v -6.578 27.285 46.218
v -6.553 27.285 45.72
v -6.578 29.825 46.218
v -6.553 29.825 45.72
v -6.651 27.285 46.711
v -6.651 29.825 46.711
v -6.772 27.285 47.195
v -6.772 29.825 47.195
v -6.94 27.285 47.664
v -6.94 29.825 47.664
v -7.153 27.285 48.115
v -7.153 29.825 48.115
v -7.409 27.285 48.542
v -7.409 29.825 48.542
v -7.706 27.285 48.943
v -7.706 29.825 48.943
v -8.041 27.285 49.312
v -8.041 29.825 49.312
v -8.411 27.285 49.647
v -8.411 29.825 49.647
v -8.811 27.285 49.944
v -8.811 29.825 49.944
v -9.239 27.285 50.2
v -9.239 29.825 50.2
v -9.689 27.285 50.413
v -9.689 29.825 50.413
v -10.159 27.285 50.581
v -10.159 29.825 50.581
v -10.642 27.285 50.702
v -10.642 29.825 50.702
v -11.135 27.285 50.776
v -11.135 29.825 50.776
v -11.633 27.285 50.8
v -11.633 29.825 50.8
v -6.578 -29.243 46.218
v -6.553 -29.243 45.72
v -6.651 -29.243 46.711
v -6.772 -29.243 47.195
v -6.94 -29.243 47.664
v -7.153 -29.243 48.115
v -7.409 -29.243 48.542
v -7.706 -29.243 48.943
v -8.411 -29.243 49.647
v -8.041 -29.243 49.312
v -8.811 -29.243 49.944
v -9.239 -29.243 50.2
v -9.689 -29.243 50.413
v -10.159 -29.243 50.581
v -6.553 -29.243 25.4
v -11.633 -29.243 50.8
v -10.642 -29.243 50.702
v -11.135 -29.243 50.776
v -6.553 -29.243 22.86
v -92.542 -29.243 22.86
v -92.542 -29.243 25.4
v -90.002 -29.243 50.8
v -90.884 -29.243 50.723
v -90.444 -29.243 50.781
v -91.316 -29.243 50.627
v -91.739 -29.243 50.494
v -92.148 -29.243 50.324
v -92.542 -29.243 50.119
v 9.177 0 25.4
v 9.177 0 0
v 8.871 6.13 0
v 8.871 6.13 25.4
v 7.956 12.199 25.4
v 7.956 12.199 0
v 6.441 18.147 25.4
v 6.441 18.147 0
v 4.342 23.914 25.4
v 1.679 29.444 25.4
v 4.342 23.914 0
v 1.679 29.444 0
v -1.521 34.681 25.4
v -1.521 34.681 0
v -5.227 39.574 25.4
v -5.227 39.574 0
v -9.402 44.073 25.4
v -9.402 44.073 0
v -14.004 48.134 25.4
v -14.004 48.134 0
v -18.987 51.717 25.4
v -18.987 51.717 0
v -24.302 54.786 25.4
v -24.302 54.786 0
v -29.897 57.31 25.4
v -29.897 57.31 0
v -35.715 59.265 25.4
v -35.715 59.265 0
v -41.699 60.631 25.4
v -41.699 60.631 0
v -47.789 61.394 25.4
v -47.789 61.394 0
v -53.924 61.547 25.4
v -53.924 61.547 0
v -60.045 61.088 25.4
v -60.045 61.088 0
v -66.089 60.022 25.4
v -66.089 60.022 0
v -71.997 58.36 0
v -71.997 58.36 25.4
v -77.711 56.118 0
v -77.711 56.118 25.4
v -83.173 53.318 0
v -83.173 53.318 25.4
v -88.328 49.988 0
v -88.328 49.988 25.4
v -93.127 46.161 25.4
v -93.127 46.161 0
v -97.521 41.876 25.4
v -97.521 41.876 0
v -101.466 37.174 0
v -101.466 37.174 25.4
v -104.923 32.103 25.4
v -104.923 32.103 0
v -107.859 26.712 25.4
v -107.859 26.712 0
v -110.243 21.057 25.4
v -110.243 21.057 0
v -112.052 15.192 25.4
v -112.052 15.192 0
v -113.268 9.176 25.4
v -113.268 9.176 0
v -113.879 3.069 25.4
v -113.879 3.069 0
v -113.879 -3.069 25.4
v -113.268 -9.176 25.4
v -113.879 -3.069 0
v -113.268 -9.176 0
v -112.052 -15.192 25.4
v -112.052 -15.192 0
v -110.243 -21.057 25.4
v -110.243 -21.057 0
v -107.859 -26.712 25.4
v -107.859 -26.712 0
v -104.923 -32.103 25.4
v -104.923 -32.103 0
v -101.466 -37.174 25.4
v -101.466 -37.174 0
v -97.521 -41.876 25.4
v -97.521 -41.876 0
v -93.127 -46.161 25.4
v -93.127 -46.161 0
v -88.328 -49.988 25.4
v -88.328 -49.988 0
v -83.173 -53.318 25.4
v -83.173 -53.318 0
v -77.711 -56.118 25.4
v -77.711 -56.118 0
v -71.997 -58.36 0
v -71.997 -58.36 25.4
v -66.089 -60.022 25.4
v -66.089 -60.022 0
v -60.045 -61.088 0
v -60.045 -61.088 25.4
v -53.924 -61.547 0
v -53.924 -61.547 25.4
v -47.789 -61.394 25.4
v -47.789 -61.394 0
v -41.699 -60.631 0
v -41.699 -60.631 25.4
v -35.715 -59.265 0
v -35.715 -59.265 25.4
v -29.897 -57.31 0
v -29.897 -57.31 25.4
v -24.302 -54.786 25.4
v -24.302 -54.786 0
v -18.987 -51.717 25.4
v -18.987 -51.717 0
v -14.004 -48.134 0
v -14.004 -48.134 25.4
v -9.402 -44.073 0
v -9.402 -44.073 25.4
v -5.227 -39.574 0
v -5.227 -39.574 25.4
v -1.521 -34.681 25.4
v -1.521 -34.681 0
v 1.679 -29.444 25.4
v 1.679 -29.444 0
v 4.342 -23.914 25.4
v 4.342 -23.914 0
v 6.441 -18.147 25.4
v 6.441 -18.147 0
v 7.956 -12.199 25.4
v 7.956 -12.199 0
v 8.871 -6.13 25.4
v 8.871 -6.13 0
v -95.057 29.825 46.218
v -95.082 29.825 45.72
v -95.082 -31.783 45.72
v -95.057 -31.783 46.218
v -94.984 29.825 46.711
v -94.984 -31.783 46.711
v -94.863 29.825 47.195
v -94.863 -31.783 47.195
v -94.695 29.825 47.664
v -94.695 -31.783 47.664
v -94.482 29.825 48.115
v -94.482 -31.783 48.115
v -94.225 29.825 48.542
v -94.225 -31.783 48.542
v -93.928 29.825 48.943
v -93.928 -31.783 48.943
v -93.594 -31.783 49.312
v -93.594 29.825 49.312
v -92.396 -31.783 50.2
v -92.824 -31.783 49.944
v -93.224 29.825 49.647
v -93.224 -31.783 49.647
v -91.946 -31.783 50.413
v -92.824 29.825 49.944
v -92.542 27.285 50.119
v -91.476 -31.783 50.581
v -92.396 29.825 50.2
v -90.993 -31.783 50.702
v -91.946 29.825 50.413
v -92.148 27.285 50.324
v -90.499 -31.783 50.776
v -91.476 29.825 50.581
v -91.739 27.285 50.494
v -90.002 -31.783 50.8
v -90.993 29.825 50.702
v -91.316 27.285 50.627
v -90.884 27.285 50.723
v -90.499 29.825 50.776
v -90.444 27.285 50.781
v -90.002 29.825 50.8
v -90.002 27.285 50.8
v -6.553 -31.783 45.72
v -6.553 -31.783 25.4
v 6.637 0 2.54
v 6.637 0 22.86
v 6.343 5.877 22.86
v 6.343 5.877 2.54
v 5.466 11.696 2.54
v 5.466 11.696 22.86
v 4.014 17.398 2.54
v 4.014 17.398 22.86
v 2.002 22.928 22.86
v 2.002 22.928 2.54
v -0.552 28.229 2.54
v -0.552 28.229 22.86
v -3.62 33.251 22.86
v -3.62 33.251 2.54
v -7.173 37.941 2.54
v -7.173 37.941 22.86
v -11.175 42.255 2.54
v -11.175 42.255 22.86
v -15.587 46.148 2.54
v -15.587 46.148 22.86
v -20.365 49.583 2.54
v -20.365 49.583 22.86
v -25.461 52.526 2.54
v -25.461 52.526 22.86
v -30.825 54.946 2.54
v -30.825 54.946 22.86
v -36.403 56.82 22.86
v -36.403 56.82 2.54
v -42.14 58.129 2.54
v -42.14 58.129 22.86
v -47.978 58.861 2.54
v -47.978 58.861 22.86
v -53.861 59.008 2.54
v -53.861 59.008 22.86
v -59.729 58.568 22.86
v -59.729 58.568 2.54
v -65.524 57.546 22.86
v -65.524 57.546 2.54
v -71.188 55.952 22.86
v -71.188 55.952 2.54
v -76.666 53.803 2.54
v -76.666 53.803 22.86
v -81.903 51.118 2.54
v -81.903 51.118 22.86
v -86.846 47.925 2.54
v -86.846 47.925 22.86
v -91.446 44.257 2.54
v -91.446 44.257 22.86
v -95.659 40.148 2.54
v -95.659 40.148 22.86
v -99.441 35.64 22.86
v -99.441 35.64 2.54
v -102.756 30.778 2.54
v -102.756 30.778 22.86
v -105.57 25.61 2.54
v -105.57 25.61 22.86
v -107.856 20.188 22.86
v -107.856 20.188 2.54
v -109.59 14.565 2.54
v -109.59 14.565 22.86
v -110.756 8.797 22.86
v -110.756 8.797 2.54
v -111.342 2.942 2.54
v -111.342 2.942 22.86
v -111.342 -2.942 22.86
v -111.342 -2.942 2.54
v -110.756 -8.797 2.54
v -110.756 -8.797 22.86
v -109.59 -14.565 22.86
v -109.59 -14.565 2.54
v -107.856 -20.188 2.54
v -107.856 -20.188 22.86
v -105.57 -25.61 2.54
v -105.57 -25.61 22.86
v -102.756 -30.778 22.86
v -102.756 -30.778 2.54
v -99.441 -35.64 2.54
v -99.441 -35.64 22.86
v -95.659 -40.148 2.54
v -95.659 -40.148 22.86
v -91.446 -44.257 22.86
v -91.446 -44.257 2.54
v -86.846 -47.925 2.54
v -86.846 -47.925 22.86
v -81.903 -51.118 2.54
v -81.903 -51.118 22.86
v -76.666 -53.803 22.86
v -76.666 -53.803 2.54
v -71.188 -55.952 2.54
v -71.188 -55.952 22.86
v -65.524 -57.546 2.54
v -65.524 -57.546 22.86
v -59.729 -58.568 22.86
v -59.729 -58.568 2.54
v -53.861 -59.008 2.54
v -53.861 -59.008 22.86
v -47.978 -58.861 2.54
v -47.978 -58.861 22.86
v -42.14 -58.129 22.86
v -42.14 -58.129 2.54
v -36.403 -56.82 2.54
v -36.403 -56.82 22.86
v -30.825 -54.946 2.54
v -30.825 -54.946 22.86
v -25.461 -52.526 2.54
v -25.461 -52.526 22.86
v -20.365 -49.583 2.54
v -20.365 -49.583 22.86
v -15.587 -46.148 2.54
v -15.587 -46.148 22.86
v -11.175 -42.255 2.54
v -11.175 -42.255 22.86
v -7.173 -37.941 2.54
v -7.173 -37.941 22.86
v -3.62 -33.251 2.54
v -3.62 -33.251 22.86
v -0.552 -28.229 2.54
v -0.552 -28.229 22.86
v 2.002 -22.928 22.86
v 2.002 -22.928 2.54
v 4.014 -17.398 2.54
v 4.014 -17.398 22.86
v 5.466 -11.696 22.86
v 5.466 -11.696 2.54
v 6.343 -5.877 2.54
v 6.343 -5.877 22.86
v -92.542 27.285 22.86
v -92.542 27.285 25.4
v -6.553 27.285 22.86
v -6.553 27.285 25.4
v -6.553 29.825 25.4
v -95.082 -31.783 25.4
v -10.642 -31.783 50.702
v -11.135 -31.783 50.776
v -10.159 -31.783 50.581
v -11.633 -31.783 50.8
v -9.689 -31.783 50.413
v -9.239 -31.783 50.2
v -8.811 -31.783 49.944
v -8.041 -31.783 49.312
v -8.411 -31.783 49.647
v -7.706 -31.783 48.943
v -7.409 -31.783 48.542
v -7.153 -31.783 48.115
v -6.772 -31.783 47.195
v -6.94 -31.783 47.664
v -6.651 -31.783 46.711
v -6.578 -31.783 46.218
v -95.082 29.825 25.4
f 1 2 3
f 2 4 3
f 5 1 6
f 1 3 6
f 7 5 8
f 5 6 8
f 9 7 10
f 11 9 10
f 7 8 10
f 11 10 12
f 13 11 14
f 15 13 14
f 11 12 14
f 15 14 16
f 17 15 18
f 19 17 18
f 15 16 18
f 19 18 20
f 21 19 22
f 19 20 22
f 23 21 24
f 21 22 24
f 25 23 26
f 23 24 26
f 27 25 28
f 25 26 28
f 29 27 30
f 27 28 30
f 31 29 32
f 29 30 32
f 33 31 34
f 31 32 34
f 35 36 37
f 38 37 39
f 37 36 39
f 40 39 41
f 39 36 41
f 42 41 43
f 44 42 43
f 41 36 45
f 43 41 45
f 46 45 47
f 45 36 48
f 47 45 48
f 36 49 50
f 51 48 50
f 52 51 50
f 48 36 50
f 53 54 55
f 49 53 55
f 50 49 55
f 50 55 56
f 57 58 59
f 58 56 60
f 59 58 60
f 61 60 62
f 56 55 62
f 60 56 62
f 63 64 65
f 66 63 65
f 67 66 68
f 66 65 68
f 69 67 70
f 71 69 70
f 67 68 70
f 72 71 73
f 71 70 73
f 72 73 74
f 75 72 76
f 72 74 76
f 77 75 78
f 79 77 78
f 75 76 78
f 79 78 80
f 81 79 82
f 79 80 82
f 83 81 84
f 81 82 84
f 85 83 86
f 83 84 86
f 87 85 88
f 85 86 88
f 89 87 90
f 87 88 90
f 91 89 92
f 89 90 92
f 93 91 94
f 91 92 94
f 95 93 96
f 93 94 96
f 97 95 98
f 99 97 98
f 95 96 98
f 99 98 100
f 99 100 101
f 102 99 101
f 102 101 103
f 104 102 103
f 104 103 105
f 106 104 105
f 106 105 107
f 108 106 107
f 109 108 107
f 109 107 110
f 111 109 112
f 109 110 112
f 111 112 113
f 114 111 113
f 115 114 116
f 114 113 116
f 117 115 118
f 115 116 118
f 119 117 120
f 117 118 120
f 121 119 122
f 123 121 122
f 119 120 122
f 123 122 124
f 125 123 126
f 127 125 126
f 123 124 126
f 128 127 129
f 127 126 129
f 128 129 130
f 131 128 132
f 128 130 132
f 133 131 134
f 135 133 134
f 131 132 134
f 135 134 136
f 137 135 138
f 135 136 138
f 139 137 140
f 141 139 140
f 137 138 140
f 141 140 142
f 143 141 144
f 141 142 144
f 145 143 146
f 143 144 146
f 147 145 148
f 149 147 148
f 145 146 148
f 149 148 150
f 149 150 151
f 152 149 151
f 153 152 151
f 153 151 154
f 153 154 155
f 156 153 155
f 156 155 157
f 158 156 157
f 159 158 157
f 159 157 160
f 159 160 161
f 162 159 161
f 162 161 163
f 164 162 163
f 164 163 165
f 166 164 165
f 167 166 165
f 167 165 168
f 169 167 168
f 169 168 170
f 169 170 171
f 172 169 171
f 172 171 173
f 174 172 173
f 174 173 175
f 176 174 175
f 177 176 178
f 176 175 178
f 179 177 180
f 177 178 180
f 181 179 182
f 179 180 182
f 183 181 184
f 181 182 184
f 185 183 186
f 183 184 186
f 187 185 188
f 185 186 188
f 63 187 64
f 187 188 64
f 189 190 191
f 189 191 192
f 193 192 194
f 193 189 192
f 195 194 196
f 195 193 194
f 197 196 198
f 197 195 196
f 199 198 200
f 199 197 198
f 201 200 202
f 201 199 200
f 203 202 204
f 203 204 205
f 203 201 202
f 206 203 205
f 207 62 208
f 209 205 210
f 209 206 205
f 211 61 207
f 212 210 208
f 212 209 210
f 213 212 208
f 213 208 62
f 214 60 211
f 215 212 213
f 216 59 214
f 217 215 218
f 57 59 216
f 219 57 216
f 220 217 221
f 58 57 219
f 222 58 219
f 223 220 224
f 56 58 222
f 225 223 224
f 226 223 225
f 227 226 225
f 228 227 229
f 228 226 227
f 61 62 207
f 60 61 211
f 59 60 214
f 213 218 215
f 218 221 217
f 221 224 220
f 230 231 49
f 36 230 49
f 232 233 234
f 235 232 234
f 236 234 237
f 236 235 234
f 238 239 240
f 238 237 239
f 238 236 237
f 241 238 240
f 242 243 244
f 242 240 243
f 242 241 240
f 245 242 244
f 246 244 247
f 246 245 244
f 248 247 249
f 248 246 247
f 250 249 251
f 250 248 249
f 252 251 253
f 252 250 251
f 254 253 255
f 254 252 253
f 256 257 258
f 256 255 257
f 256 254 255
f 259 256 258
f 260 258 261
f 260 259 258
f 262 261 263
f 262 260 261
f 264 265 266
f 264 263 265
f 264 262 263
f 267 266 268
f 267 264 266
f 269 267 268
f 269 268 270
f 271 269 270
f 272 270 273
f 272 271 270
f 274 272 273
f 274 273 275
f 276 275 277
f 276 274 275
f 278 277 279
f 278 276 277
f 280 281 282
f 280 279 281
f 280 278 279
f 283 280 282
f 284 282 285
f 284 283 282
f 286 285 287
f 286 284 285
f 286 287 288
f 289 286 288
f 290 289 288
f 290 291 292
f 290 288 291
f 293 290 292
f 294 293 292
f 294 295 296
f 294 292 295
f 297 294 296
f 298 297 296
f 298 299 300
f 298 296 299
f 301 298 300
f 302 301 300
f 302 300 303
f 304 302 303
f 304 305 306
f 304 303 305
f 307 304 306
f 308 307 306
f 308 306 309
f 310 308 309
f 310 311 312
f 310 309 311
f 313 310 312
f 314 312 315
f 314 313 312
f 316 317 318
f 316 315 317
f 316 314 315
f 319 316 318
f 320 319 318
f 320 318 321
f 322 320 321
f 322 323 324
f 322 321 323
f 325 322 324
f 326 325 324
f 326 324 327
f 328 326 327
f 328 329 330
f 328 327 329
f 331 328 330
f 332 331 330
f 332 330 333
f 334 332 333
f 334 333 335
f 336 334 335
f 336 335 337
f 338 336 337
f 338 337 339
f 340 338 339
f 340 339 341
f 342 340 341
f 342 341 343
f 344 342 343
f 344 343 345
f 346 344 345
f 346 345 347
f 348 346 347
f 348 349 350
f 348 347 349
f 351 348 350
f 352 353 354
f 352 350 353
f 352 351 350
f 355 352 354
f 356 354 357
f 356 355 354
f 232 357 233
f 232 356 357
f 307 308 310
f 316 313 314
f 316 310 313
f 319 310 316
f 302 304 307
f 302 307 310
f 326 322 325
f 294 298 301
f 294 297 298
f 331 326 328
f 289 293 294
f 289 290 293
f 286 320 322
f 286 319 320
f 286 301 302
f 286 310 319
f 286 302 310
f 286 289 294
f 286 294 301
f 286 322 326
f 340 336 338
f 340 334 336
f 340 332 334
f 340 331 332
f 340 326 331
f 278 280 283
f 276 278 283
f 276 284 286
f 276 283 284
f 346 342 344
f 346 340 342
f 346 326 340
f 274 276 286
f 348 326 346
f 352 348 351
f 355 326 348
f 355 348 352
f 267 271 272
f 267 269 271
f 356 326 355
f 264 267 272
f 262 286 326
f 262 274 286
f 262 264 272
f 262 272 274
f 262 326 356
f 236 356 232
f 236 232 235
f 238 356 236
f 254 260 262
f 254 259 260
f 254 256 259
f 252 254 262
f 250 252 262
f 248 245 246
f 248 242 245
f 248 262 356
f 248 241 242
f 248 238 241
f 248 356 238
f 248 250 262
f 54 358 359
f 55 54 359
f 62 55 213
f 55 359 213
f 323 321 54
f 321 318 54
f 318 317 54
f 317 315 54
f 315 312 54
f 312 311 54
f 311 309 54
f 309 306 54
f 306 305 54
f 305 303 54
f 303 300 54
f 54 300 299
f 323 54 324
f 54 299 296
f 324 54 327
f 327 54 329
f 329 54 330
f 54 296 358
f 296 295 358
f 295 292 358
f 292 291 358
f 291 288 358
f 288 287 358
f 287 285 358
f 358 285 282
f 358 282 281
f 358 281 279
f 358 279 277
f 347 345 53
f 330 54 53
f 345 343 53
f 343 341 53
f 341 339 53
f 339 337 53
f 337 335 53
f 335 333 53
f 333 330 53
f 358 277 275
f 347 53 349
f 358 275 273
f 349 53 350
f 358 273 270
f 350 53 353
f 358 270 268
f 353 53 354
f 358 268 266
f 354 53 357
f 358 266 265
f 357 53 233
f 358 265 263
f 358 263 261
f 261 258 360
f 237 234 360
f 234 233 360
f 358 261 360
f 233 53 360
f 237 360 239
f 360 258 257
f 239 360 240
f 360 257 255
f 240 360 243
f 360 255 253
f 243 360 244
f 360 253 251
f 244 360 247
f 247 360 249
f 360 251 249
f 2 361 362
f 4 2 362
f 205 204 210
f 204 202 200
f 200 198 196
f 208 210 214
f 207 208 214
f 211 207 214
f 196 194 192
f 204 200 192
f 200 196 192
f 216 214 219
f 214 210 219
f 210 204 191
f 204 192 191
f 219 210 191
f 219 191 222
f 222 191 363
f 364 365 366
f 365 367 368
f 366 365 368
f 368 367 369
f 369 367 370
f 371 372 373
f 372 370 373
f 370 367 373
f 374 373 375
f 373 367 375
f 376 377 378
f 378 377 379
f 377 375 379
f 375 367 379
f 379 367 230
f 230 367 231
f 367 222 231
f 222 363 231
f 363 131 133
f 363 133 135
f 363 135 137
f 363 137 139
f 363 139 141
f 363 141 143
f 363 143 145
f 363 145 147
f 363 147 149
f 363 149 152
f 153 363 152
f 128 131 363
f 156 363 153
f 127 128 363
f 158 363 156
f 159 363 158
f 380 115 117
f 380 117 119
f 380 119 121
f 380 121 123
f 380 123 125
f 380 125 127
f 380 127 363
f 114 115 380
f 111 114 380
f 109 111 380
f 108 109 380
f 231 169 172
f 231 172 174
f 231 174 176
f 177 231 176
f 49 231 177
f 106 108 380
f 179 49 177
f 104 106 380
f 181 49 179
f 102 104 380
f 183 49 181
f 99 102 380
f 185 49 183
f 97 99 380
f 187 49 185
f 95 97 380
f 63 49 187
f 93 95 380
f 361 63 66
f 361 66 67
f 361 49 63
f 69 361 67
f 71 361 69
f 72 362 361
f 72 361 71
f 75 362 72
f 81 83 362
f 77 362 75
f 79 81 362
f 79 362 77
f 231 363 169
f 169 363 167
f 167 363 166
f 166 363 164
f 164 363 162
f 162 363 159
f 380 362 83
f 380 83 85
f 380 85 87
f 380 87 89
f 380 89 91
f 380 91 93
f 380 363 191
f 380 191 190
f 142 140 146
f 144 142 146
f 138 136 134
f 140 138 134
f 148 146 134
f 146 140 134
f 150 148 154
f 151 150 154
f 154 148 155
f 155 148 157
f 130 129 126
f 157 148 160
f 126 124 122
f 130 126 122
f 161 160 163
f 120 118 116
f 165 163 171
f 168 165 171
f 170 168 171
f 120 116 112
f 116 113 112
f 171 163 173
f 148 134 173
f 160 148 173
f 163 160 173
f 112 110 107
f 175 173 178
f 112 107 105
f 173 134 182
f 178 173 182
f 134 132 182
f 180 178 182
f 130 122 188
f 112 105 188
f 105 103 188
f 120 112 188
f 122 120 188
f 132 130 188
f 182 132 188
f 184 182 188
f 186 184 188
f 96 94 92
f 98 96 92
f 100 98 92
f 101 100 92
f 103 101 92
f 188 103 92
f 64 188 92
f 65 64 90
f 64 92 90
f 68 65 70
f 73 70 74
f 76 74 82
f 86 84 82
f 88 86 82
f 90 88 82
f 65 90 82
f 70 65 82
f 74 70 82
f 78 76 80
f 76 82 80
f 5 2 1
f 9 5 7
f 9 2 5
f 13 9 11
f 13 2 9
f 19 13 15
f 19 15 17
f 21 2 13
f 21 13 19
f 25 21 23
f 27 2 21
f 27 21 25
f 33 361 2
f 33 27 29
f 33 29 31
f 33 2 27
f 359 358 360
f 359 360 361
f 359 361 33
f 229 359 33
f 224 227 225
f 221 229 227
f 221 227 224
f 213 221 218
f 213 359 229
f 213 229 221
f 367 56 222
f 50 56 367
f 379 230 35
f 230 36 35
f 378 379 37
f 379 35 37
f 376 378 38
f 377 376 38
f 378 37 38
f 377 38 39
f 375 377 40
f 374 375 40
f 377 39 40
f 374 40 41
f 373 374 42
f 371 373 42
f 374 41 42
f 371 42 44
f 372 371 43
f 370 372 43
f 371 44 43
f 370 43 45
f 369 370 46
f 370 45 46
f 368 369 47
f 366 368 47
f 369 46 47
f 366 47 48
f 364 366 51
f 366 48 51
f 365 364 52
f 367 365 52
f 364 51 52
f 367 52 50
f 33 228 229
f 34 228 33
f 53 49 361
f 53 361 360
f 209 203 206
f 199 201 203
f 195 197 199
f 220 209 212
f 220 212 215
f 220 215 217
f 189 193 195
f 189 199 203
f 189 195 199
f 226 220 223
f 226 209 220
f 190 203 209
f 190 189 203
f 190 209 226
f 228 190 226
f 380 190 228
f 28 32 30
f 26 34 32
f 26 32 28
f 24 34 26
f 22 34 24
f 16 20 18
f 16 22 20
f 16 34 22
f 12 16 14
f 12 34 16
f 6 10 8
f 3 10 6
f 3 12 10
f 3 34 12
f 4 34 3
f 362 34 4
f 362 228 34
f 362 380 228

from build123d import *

# Parameters (mm, degrees)
F0_R        = 61.5660175878
F1_DEPTH    = 25.4
F2_W        = 88.528262917
F2_H        = 61.6074204445
F3_DEPTH    = 25.4
F4_T        = 2.54
F4_T3_DEPTH = 93.608262917
F4_T5_DEPTH = 66.6874204445
F5_T1_DEPTH = 87.0074204445
F6_R        = 5.08


# Not quite as in the source:
# - a fillet or chamfer that OpenCascade refuses, or shapes differently, is made with other operations: its cross-section is extruded or revolved along the edge and cut away or added
# - a shell that OpenCascade refuses in one call is made with other operations: the cavity is built on its own and cut out


with BuildPart() as f1:
    # F0 (on Top) → F1 (new body)
    with BuildSketch(Plane.XY):
        with Locations((-52.3894988, 0)):
            Circle(F0_R)
    extrude(amount=F1_DEPTH)

    # F2 (on face) → F3 (join)
    with BuildSketch(Plane.XY.offset(25.4)):
        with Locations((-50.8173767012, -0.9788312018)):
            Rectangle(F2_W, F2_H)
    extrude(amount=F3_DEPTH)

    # F4: shell of thickness 2.54, made by hand


with BuildPart() as f4_core1:
    # F4_t2: copy of F1
    add(f1.part)

    # the walls: a layer under each face that stays
    f4_faces = [f4_core1.faces().sort_by_distance(p)[0] for p in [
        (-113.9555163879, 0, 12.7),
        (-52.3894988, 0, 0),
        (-93.4335105253, -41.0440117252, 25.4),
        (-50.8173767012, 29.8248790205, 38.1),
        (-95.0815081596, -0.9788312018, 38.1),
        (-50.8173767012, -31.782541424, 38.1),
    ]]
    thicken(f4_faces, amount=-F4_T, mode=Mode.SUBTRACT)

    # F4_s4 → F4_t3 (cut)
    with BuildSketch(Plane.YZ.offset(-97.6215081596)):
        Polygon((29.8502790205, 25.4254), (29.8248790205, 22.86), (27.2848790205, 22.86), (27.2848790205, 25.4), align=None)
        Polygon((-31.807941424, 25.4254), (-31.782541424, 22.86), (-29.242541424, 22.86), (-29.242541424, 25.4), align=None)
    extrude(amount=F4_T3_DEPTH, mode=Mode.SUBTRACT)

    # F4_s6 → F4_t5 (cut)
    with BuildSketch(Plane.XZ.offset(-32.3648790205)):
        Polygon((-95.1069081596, 25.4254), (-95.0815081596, 22.86), (-92.5415081596, 22.86), (-92.5415081596, 25.4), align=None)
    extrude(amount=F4_T5_DEPTH, mode=Mode.SUBTRACT)


with BuildPart() as f1_1:
    add(f1.part)

    # what is left inside the walls is the cavity
    f4_cavity = [f4_core1.part.solids().sort_by_distance(p)[0] for p in [
        (-52.389499, -19.675339, 2.5654),
    ]]
    add(f4_cavity, mode=Mode.SUBTRACT)

    # F5: fillet of radius 5.08 on 1 edges, made by hand

    # F5_s2 → F5_t1 (cut)
    with BuildSketch(Plane.XZ.offset(-42.5248790205)):
        with BuildLine():
            ThreePointArc((-95.0815081596, 45.72), (-93.5936106081, 49.3121024484), (-90.0015081596, 50.8))
            Line((-90.0015081596, 50.8), (-95.0815081596, 50.8))
            Line((-95.0815081596, 50.8), (-95.0815081596, 45.72))
        make_face()
    extrude(amount=F5_T1_DEPTH, mode=Mode.SUBTRACT)

    # F6
    f6_edges = [f1_1.edges().sort_by_distance(p)[0] for p in [
        (-6.553245, -30.512541, 50.8),
        (-6.553245, 28.554879, 50.8),
    ]]
    fillet(f6_edges, radius=F6_R)


solid = f1_1.part
